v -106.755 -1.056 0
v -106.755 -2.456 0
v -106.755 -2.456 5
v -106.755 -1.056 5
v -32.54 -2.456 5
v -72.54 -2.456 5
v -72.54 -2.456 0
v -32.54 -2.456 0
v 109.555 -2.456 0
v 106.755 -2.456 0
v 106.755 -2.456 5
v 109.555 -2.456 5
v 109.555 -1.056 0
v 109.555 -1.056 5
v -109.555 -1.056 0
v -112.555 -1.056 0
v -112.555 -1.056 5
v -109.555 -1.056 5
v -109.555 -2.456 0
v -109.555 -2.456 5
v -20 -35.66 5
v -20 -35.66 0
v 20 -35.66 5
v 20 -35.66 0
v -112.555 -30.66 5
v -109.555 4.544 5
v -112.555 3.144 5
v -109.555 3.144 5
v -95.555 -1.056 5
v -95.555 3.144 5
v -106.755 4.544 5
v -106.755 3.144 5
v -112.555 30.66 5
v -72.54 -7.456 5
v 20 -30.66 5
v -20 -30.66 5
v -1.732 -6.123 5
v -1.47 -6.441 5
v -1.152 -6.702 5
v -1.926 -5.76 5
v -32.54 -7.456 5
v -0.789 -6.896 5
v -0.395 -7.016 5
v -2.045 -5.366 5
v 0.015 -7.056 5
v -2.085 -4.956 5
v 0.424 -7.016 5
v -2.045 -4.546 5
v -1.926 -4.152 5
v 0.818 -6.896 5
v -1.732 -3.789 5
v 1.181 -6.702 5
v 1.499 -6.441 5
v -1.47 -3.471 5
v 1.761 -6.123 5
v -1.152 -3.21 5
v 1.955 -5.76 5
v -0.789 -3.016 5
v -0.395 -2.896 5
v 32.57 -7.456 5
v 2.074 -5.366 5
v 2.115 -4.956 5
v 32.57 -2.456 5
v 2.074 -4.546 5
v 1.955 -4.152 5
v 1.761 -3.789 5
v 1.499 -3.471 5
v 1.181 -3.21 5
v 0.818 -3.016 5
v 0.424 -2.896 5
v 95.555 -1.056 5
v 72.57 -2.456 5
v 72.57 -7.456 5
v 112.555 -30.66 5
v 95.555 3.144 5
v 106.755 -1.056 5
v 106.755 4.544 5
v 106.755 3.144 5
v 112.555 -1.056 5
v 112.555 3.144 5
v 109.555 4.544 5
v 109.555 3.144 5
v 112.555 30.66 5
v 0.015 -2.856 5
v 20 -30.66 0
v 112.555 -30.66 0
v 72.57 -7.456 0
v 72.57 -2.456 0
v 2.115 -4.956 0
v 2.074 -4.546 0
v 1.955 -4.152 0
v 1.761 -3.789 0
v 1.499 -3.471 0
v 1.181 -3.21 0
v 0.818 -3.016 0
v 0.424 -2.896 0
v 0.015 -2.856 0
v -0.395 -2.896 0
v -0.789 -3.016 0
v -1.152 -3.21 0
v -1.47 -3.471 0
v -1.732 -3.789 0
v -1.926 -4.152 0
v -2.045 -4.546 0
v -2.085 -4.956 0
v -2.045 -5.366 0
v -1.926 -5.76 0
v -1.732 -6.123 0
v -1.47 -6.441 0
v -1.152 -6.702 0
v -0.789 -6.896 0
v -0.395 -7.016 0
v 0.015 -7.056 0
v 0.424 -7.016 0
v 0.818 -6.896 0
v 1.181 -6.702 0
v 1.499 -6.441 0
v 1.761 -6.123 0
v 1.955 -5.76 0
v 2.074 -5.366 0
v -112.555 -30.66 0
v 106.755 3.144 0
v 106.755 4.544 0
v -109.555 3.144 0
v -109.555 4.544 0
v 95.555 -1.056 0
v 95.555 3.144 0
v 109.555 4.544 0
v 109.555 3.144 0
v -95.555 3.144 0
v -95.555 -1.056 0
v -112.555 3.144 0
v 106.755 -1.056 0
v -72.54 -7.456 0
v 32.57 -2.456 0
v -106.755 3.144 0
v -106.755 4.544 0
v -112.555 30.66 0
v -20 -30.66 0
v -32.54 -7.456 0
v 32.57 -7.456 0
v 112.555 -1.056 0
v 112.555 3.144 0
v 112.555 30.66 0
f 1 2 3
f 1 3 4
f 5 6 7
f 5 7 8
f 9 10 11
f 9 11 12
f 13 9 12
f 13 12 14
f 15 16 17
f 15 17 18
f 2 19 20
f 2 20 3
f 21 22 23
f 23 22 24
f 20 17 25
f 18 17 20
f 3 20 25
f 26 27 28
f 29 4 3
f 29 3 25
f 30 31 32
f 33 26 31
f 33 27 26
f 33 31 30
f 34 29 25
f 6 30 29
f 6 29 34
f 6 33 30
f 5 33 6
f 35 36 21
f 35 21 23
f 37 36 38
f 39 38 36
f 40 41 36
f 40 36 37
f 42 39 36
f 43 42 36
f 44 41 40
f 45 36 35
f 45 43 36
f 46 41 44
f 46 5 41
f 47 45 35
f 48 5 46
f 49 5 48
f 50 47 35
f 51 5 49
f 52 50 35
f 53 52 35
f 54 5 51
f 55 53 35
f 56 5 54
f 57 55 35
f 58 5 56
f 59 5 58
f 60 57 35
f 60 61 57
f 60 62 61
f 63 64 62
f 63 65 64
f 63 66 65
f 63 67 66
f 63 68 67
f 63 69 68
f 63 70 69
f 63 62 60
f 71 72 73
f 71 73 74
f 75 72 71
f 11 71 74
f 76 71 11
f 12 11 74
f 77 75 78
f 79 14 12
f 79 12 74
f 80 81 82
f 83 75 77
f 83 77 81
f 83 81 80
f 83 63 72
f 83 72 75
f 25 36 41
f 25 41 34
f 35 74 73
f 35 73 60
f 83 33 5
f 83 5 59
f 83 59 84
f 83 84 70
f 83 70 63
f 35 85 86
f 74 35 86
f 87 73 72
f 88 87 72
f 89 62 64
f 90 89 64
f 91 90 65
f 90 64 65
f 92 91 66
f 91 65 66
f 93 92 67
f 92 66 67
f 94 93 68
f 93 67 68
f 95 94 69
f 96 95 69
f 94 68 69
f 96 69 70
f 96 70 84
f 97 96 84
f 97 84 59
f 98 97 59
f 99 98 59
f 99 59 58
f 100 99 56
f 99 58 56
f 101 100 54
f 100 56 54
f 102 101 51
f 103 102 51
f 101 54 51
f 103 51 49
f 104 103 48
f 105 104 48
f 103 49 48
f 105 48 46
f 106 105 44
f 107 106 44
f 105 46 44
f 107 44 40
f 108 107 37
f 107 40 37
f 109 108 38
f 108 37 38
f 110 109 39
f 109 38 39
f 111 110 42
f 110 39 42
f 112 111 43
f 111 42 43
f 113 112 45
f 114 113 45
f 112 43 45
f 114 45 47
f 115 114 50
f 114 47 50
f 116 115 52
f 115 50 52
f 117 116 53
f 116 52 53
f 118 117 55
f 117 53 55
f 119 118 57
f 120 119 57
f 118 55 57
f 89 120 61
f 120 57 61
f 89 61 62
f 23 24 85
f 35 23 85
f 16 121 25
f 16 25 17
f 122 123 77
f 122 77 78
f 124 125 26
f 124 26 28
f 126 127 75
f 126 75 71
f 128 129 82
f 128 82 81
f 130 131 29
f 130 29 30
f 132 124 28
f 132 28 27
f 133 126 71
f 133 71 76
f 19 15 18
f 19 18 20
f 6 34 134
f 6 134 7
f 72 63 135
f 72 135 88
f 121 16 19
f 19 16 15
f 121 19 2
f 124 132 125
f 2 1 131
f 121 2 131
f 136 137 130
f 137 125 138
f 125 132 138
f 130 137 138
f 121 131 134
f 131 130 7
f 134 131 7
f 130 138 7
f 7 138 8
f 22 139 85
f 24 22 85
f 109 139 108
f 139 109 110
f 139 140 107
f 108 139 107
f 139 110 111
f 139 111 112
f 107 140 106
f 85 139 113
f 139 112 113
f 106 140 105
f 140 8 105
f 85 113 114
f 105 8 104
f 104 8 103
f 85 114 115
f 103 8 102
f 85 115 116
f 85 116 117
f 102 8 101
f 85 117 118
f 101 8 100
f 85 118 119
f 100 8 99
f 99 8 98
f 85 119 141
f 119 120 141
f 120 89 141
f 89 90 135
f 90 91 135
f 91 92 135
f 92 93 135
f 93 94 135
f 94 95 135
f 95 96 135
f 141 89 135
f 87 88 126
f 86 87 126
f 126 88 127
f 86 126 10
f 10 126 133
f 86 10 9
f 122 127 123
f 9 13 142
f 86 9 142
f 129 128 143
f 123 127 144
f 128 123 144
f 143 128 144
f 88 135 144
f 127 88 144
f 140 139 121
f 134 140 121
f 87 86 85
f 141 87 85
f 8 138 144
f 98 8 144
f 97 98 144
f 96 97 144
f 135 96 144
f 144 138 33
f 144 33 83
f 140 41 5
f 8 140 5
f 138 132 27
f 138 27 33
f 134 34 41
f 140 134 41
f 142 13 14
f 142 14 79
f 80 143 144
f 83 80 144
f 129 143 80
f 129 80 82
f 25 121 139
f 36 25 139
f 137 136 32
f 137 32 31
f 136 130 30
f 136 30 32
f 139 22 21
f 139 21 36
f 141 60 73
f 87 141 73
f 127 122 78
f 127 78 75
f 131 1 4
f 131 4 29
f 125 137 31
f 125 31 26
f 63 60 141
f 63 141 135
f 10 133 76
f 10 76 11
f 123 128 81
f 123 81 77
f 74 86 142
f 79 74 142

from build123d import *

# Parameters (mm, degrees)
SKETCH1_W                 = 225.11
SKETCH1_H                 = 61.32
BOSS_EXTRUDE1_DEPTH       = 5
SKETCH2_R                 = 2.1
SKETCH2_W                 = 40
SKETCH2_H                 = 5
CUT_EXTRUDE1_DEPTH        = 5
BOSS_EXTRUDE2_START       = -5
BOSS_EXTRUDE2_DEPTH       = 5
BOSS_EXTRUDE2_2_OUTLINE_W = 40
BOSS_EXTRUDE2_2_OUTLINE_H = 5
BOSS_EXTRUDE2_2_DEPTH     = 5


# Read off the part's stored shape, not the designer's step: Boss-Extrude2
with BuildPart() as part:
    # Sketch1 → Boss-Extrude1 (new body)
    with BuildSketch(Plane.XY):
        Rectangle(SKETCH1_W, SKETCH1_H)
    extrude(amount=BOSS_EXTRUDE1_DEPTH)

    # Sketch2 → Cut-Extrude1 (cut)
    with BuildSketch(Plane.XY.offset(5)):
        with Locations((0.014505864, -4.956)):
            Circle(SKETCH2_R)
        with Locations((52.569505864, -4.956)):
            Rectangle(SKETCH2_W, SKETCH2_H)
        with Locations((-52.540494136, -4.956)):
            Rectangle(SKETCH2_W, SKETCH2_H)
    extrude(amount=-CUT_EXTRUDE1_DEPTH, mode=Mode.SUBTRACT)

    # Boss-Extrude2 outline → Boss-Extrude2 (cut)
    with BuildSketch(Plane.XY.offset(5).offset(BOSS_EXTRUDE2_START)):
        Polygon((109.555, -2.456), (109.555, -1.056), (112.555, -1.056), (112.555, 3.144), (109.555, 3.144), (109.555, 4.544), (106.755, 4.544), (106.755, 3.144), (95.555, 3.144), (95.555, -1.056), (106.755, -1.056), (106.755, -2.456), align=None)
        Polygon((-112.555, 3.144), (-112.555, -1.056), (-109.555, -1.056), (-109.555, -2.456), (-106.755, -2.456), (-106.755, -1.056), (-95.555, -1.056), (-95.555, 3.144), (-106.755, 3.144), (-106.755, 4.544), (-109.555, 4.544), (-109.555, 3.144), align=None)
    extrude(amount=BOSS_EXTRUDE2_DEPTH, mode=Mode.SUBTRACT)

    # Boss-Extrude2 2 outline → Boss-Extrude2 2 (add)
    with BuildSketch(Plane.XY.offset(5).offset(BOSS_EXTRUDE2_START)):
        with Locations((0, -33.16)):
            Rectangle(BOSS_EXTRUDE2_2_OUTLINE_W, BOSS_EXTRUDE2_2_OUTLINE_H)
    extrude(amount=BOSS_EXTRUDE2_2_DEPTH)


solid = part.part
